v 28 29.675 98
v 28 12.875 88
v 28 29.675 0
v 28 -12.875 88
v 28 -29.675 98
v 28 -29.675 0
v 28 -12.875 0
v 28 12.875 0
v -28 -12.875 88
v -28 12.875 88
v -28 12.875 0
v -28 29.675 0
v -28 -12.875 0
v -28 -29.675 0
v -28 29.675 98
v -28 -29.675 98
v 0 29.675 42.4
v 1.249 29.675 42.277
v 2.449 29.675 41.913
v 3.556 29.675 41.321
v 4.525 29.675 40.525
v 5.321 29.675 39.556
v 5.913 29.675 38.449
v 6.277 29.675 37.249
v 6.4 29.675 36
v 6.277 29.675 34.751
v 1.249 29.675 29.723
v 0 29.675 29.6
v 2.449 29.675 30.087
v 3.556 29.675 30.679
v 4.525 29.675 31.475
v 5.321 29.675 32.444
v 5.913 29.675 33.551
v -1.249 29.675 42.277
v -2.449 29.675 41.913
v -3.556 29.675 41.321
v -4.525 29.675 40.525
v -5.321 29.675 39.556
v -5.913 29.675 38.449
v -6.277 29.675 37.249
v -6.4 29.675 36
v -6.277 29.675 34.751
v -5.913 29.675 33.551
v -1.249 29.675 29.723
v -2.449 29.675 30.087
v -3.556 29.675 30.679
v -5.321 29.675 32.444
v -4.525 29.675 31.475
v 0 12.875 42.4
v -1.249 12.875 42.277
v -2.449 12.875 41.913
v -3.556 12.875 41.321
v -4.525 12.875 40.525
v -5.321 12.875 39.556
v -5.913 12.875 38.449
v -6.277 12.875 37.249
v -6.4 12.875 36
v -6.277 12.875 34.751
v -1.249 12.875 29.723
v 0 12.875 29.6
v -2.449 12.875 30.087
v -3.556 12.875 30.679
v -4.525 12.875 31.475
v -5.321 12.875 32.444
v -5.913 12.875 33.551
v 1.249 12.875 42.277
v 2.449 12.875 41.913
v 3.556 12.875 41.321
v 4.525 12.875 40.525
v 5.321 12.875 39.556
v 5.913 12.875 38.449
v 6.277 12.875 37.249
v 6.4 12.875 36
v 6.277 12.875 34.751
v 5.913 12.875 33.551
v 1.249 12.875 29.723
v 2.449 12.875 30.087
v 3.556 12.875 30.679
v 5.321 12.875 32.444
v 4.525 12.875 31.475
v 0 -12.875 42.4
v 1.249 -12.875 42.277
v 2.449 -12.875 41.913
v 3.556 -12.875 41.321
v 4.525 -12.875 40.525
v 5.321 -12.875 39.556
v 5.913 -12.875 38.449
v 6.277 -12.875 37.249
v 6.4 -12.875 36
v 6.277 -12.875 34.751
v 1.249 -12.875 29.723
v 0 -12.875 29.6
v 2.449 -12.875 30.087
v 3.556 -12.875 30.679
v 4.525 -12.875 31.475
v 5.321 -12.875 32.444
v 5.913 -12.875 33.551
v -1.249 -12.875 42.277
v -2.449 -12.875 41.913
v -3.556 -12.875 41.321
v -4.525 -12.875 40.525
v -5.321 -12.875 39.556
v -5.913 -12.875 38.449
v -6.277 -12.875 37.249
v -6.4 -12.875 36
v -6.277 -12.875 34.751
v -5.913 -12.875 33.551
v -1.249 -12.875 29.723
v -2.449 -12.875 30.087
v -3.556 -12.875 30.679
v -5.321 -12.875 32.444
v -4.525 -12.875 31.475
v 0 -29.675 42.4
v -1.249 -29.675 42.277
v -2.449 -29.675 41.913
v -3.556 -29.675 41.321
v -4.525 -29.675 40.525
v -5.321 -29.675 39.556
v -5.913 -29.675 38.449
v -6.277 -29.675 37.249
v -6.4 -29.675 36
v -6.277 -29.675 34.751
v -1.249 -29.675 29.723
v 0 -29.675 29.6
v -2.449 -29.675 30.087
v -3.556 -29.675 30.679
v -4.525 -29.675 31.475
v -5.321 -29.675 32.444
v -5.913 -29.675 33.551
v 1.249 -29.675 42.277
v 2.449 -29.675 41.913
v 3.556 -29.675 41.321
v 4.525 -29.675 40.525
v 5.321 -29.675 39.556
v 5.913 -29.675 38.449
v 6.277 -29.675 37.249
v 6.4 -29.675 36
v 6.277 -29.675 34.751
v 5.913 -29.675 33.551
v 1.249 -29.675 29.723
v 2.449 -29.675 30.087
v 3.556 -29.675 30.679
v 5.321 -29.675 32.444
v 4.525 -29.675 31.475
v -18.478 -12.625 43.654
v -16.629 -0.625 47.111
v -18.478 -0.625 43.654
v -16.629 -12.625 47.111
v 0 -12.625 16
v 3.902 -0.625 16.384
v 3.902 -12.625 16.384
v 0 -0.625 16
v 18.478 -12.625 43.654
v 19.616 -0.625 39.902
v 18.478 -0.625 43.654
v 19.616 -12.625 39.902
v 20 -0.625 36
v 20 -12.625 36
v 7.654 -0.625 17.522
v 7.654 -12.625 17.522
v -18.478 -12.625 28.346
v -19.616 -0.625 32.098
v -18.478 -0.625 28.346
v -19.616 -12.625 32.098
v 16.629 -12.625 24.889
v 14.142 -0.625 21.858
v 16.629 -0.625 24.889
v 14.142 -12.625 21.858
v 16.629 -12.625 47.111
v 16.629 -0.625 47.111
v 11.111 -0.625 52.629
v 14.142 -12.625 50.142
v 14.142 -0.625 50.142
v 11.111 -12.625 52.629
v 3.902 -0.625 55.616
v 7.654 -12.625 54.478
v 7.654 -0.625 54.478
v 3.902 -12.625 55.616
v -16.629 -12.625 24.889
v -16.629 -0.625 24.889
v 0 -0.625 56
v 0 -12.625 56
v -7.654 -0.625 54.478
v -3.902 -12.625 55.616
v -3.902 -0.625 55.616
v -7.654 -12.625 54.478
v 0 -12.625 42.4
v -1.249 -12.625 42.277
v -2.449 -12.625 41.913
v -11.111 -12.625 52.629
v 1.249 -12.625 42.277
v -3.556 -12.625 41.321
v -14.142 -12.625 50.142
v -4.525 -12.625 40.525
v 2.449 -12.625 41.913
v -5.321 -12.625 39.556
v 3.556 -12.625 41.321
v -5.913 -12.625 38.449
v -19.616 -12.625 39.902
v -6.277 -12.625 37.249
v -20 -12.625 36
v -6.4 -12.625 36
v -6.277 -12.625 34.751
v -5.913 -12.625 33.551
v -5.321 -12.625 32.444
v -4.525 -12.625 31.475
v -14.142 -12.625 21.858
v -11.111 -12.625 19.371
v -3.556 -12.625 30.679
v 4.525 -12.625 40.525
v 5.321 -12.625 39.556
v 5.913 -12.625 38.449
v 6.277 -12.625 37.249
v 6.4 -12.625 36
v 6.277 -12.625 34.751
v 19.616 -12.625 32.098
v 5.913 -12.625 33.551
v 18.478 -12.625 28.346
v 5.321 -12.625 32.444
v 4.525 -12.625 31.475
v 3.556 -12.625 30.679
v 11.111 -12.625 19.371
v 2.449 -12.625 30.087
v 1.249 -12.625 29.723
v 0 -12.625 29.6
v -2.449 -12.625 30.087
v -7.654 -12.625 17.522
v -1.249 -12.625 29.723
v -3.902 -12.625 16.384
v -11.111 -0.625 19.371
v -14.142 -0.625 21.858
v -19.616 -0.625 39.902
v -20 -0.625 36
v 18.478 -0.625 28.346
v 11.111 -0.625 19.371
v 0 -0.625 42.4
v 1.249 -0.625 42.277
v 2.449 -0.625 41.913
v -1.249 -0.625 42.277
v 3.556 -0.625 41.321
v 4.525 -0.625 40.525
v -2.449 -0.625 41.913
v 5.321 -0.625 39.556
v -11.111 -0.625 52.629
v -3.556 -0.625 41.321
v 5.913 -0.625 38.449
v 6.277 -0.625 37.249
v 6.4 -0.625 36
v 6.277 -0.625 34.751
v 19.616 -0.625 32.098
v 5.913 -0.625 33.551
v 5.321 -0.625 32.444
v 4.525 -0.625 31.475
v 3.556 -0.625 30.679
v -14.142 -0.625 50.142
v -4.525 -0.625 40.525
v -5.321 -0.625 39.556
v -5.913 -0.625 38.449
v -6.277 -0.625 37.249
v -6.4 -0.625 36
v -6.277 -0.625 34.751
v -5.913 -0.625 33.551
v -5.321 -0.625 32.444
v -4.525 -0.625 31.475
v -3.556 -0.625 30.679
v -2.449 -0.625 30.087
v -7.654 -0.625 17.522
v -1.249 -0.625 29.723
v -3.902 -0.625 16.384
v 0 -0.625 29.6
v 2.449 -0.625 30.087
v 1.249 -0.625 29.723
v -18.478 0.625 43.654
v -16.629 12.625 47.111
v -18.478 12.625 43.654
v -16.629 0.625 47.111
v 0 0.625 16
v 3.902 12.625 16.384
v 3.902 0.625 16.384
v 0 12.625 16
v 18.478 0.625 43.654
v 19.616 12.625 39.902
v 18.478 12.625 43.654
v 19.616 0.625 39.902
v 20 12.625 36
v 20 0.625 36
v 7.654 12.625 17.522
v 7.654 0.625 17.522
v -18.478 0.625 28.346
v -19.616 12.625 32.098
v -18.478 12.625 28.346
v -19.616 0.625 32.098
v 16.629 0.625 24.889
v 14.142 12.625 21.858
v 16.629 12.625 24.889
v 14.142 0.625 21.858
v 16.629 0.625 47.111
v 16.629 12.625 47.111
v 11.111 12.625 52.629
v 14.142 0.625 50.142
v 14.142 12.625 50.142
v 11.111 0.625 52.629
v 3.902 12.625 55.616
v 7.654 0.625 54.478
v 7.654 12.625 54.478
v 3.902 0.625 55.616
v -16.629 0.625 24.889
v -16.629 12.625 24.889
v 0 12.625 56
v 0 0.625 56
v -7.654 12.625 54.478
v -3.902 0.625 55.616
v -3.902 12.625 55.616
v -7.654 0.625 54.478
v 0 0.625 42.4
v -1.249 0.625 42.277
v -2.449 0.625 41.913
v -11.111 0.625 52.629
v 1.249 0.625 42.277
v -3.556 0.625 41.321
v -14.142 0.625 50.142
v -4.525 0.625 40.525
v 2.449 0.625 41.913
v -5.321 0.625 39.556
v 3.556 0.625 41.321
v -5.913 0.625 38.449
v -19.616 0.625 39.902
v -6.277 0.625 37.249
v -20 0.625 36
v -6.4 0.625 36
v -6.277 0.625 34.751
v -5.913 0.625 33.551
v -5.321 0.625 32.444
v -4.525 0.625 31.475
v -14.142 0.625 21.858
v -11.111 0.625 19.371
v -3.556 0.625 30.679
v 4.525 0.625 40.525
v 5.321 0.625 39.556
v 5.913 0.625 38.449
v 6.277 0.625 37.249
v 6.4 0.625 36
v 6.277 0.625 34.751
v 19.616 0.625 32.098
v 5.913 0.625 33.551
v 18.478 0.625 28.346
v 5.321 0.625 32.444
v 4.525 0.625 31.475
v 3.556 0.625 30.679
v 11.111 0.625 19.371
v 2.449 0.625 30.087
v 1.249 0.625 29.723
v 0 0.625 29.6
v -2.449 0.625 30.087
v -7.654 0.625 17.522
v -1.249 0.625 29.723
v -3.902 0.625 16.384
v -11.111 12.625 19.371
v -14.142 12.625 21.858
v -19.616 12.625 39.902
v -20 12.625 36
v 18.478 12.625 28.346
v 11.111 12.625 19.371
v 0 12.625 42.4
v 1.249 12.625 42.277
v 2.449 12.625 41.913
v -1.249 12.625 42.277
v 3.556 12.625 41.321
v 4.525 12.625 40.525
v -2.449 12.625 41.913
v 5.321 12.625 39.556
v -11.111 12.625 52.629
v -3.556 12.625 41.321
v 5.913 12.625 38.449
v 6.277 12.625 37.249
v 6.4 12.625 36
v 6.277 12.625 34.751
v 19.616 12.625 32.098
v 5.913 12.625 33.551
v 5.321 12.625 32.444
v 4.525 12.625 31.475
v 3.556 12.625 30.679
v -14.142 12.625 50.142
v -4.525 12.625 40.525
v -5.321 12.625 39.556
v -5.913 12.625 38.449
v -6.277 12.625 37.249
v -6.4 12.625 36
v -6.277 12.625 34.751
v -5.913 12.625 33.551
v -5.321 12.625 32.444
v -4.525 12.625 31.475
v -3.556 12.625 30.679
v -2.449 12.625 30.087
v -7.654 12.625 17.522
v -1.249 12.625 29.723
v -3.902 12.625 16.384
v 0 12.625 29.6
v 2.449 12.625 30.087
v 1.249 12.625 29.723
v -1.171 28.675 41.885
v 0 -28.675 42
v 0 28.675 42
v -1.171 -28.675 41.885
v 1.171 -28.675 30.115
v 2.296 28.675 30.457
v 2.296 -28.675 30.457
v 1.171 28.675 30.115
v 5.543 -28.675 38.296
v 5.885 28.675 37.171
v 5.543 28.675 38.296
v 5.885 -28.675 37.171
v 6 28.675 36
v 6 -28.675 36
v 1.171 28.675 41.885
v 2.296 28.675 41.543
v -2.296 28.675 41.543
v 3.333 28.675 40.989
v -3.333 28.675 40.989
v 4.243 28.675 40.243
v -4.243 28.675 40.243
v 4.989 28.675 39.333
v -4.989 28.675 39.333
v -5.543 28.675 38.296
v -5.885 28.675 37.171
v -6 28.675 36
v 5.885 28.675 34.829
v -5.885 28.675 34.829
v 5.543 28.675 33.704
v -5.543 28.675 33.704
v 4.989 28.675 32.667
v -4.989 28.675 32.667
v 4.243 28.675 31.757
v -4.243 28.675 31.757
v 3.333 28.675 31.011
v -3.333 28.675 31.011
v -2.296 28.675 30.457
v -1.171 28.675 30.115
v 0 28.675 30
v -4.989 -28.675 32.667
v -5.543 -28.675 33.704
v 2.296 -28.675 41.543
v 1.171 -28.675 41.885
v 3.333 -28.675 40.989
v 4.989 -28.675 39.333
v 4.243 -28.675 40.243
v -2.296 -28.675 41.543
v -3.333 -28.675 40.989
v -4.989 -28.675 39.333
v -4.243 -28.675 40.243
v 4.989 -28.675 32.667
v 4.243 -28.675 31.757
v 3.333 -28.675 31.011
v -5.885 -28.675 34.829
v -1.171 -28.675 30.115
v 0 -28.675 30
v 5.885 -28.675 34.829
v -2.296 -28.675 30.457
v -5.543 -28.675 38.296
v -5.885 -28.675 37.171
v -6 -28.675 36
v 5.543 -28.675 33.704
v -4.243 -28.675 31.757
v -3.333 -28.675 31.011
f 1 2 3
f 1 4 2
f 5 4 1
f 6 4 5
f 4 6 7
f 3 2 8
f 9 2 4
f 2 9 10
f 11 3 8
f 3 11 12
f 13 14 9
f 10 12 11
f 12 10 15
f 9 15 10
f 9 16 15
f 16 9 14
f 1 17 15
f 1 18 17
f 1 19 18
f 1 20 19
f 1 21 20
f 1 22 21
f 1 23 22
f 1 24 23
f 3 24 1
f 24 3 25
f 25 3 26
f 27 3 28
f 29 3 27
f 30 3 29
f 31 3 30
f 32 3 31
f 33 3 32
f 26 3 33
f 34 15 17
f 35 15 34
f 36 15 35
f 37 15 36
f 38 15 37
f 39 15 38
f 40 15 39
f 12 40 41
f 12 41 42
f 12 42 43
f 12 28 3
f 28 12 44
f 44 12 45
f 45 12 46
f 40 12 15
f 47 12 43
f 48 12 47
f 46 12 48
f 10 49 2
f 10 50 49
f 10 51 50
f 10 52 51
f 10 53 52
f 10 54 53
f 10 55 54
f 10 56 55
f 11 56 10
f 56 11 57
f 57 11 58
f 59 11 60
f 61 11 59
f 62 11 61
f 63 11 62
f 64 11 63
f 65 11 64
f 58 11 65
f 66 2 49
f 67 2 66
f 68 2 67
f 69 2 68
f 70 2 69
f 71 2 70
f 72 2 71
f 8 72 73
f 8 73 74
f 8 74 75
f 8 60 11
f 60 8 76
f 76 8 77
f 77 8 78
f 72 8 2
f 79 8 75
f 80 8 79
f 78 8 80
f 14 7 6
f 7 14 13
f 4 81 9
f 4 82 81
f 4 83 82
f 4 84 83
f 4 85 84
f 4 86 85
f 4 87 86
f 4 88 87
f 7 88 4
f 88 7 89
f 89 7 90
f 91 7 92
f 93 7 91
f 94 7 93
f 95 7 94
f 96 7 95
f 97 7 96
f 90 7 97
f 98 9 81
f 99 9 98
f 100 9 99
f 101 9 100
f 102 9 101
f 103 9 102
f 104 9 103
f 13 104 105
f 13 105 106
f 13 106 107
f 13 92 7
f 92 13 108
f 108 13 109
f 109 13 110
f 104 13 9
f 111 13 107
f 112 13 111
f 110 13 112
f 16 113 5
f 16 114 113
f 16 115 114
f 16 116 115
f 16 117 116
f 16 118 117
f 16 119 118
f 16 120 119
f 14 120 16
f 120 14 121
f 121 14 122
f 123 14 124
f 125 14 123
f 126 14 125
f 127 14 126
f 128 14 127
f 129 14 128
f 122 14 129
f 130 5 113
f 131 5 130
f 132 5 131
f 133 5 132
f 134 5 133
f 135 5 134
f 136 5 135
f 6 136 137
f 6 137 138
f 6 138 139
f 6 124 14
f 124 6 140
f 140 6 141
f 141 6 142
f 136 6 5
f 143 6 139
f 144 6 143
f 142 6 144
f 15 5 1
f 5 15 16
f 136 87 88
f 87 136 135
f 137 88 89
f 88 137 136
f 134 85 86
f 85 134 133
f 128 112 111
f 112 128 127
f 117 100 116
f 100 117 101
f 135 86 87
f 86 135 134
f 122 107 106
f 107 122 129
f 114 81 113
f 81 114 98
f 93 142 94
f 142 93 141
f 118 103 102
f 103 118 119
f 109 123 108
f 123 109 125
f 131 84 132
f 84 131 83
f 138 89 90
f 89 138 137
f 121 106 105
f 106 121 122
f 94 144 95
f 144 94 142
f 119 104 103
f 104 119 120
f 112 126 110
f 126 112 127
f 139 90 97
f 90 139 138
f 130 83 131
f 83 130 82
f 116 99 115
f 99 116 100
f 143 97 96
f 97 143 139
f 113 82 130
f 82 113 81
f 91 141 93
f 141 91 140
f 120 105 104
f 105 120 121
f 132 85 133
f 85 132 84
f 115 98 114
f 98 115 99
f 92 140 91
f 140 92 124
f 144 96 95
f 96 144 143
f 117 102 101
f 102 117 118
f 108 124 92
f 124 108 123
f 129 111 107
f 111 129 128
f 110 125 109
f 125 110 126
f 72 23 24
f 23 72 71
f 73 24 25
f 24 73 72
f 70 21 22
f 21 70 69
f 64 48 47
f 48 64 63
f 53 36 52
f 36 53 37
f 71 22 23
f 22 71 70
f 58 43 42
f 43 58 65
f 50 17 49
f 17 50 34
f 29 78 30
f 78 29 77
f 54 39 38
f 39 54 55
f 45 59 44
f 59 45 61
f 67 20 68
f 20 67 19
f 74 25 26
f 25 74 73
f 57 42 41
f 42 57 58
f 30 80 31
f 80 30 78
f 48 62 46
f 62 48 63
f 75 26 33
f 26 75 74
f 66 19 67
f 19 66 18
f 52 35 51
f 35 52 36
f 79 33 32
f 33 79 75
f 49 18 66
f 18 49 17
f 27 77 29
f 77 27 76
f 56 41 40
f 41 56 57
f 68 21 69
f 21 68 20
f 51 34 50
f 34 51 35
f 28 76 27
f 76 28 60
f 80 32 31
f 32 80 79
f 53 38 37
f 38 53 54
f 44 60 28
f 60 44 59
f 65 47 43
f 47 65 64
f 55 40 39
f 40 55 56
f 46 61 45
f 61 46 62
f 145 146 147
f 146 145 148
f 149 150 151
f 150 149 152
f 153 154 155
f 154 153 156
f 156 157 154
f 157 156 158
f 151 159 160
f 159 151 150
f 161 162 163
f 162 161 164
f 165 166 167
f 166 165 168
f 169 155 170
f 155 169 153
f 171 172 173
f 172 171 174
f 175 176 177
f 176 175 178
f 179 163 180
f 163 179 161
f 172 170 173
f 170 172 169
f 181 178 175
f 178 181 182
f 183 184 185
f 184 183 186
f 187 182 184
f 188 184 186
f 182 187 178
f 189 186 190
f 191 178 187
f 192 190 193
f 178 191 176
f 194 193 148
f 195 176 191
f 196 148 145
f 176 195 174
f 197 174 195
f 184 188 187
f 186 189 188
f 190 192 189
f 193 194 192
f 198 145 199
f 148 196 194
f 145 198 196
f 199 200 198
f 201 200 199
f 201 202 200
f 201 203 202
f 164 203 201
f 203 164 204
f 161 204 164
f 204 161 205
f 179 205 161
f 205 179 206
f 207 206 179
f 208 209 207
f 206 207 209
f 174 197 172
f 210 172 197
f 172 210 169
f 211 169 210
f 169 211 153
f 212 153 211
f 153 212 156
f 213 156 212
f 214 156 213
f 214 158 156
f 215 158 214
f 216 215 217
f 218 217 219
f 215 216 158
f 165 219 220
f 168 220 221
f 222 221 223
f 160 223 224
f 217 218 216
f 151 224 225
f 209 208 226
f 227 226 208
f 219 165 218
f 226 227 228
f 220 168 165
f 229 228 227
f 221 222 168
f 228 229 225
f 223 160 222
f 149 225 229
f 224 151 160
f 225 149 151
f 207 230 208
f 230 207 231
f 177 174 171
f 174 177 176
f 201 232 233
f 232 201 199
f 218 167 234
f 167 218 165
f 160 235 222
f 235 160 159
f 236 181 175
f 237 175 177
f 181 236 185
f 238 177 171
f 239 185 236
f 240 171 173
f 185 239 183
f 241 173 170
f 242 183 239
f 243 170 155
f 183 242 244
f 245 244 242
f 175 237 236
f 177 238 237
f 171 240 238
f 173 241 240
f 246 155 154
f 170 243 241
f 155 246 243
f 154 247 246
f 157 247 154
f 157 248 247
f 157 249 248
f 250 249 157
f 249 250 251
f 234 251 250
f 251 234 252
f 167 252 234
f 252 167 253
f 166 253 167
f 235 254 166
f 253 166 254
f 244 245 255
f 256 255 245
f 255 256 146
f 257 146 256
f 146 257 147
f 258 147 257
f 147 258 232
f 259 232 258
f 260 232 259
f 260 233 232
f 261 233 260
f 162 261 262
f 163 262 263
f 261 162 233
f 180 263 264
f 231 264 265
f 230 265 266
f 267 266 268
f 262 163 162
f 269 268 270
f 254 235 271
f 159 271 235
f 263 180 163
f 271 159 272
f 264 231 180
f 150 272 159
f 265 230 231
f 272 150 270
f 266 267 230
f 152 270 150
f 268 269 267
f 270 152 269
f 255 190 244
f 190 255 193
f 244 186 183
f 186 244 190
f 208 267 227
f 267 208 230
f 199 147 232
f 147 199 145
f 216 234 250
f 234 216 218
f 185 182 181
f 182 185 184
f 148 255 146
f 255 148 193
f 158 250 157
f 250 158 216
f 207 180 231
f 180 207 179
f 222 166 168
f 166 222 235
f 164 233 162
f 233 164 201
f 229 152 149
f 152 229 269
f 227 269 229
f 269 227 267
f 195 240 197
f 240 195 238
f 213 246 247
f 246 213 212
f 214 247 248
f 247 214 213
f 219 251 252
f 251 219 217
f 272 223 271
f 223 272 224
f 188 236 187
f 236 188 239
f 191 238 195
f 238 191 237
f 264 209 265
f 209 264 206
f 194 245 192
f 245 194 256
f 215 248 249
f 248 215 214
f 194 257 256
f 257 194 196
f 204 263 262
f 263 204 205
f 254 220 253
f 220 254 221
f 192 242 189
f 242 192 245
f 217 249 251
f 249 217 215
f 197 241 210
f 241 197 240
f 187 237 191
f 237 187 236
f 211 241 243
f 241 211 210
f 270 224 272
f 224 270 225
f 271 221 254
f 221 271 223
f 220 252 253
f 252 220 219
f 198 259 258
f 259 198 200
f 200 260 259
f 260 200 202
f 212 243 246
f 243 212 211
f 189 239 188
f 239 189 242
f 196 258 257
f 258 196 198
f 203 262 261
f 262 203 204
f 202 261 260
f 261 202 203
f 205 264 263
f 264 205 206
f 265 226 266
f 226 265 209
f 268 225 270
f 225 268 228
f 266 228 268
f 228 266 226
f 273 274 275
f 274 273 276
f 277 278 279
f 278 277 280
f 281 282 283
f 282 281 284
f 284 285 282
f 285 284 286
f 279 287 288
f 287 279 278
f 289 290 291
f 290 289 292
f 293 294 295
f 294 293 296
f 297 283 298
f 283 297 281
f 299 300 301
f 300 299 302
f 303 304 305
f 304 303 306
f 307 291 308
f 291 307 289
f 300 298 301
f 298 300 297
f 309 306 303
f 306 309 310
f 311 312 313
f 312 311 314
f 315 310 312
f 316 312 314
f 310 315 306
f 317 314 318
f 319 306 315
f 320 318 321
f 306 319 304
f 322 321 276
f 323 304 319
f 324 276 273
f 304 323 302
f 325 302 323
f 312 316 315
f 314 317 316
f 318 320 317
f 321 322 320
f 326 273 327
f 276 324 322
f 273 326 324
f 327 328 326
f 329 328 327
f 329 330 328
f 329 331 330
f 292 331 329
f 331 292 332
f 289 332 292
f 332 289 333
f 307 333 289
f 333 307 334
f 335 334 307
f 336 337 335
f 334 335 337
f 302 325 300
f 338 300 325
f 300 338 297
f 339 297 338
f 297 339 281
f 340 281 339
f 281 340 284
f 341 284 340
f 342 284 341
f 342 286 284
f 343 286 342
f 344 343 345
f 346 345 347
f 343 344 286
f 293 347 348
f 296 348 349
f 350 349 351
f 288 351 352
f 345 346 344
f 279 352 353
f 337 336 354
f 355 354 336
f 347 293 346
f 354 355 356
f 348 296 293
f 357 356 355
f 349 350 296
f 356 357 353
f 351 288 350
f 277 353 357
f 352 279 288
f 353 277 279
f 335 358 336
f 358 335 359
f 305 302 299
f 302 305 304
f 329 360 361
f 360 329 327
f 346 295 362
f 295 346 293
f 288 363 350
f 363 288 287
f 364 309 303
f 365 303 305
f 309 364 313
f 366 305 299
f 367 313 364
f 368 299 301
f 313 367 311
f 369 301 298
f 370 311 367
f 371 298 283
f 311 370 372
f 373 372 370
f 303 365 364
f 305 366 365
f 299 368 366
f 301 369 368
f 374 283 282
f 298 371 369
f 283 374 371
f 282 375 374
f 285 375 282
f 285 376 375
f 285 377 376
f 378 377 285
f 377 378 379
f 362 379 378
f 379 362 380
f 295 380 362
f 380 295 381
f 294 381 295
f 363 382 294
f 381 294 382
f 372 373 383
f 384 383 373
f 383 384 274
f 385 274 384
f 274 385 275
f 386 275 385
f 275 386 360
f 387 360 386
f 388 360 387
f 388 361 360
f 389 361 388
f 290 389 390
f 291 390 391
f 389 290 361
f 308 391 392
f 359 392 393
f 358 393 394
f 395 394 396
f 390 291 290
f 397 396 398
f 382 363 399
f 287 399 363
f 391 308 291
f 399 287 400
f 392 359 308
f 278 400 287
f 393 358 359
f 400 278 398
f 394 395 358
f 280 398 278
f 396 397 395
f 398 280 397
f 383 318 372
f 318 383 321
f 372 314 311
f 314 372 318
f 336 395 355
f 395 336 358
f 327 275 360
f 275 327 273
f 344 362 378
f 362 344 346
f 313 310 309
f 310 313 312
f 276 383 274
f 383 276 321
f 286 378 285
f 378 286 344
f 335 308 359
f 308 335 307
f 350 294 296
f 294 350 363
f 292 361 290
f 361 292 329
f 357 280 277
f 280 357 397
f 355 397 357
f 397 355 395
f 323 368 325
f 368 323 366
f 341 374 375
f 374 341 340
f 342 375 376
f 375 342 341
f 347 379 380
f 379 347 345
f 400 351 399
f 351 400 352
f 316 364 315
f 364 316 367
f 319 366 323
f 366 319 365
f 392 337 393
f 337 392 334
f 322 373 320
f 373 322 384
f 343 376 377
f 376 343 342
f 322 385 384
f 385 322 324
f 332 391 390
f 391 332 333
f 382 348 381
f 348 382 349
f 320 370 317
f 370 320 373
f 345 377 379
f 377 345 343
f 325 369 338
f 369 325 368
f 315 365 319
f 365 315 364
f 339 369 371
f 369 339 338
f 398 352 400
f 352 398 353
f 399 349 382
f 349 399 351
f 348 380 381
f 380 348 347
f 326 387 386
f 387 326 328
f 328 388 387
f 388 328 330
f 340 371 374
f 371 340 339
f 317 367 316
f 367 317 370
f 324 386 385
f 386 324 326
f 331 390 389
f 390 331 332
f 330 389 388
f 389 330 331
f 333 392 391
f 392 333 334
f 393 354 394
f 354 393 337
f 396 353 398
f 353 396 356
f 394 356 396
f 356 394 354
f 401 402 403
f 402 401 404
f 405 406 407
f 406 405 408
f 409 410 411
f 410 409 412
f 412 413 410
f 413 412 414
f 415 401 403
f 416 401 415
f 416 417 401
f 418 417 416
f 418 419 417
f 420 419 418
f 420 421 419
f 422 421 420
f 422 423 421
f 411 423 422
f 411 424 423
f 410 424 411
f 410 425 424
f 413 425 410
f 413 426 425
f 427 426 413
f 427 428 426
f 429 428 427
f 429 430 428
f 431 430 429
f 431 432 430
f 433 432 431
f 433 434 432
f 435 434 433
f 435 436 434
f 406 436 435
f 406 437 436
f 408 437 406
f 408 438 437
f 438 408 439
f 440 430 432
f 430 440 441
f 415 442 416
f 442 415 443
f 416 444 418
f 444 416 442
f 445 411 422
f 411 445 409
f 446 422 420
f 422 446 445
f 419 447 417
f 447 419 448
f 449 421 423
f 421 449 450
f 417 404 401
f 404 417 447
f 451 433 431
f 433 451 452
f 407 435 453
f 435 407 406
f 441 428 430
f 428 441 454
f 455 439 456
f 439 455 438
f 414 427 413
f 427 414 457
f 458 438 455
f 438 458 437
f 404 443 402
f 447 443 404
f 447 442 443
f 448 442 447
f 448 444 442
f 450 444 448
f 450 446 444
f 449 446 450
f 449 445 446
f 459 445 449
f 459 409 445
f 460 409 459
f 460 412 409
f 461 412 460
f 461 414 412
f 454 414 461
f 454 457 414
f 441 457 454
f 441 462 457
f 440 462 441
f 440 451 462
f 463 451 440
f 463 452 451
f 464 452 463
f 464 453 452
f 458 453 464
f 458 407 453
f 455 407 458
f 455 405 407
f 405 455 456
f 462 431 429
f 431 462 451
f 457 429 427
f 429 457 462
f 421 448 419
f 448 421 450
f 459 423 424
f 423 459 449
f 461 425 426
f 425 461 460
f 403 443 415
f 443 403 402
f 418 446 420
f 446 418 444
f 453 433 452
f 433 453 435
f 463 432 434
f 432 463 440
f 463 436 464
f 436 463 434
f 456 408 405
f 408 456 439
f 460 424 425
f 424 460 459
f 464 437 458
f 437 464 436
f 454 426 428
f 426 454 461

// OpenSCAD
$fn = 32;

// ------------------------------------------------------------------------
// Trolley wheel set: wheels d40, fork 88 mm tall
// Every part is its own module, assembly() places every instance.
// ------------------------------------------------------------------------

// --- part 1 ---
module trolley_fork() {
  difference() {
    union() {
      translate([-28, 12.875, 0]) cube([56, 16.8, 88]);
      translate([-28, -29.675, 0]) cube([56, 16.8, 88]);
      translate([-28, -29.675, 88]) cube([56, 59.35, 10]);
    }
    translate([0, -21.275, 36]) rotate([90, 0, 0]) cylinder(h = 18.8, d = 12.8, center = true);
    translate([0, 21.275, 36]) rotate([90, 0, 0]) cylinder(h = 18.8, d = 12.8, center = true);
  }
}

// --- part 2 ---
module trolley_wheel() {
  difference() {
      translate([0, 0, 0]) cylinder(h = 12, d = 40);
      translate([0, 0, -1]) cylinder(h = 14, d = 12.8);
    }
}

// --- part 3 ---
module trolley_axle() {
  translate([0, 0, -28.675]) cylinder(h = 57.35, d = 12);
}

// --- assembly ---
module assembly() {
  color([0.80, 0.24, 0.20]) translate([0, 0, 0]) rotate([0, 0, 0]) trolley_fork();
  color([0.20, 0.45, 0.75]) translate([0, -0.625, 36]) rotate([90, 0, 0]) trolley_wheel();
  color([0.25, 0.62, 0.32]) translate([0, 12.625, 36]) rotate([90, 0, 0]) trolley_wheel();
  color([0.92, 0.70, 0.18]) translate([0, 0, 36]) rotate([90, 0, 0]) trolley_axle();
}

assembly();
